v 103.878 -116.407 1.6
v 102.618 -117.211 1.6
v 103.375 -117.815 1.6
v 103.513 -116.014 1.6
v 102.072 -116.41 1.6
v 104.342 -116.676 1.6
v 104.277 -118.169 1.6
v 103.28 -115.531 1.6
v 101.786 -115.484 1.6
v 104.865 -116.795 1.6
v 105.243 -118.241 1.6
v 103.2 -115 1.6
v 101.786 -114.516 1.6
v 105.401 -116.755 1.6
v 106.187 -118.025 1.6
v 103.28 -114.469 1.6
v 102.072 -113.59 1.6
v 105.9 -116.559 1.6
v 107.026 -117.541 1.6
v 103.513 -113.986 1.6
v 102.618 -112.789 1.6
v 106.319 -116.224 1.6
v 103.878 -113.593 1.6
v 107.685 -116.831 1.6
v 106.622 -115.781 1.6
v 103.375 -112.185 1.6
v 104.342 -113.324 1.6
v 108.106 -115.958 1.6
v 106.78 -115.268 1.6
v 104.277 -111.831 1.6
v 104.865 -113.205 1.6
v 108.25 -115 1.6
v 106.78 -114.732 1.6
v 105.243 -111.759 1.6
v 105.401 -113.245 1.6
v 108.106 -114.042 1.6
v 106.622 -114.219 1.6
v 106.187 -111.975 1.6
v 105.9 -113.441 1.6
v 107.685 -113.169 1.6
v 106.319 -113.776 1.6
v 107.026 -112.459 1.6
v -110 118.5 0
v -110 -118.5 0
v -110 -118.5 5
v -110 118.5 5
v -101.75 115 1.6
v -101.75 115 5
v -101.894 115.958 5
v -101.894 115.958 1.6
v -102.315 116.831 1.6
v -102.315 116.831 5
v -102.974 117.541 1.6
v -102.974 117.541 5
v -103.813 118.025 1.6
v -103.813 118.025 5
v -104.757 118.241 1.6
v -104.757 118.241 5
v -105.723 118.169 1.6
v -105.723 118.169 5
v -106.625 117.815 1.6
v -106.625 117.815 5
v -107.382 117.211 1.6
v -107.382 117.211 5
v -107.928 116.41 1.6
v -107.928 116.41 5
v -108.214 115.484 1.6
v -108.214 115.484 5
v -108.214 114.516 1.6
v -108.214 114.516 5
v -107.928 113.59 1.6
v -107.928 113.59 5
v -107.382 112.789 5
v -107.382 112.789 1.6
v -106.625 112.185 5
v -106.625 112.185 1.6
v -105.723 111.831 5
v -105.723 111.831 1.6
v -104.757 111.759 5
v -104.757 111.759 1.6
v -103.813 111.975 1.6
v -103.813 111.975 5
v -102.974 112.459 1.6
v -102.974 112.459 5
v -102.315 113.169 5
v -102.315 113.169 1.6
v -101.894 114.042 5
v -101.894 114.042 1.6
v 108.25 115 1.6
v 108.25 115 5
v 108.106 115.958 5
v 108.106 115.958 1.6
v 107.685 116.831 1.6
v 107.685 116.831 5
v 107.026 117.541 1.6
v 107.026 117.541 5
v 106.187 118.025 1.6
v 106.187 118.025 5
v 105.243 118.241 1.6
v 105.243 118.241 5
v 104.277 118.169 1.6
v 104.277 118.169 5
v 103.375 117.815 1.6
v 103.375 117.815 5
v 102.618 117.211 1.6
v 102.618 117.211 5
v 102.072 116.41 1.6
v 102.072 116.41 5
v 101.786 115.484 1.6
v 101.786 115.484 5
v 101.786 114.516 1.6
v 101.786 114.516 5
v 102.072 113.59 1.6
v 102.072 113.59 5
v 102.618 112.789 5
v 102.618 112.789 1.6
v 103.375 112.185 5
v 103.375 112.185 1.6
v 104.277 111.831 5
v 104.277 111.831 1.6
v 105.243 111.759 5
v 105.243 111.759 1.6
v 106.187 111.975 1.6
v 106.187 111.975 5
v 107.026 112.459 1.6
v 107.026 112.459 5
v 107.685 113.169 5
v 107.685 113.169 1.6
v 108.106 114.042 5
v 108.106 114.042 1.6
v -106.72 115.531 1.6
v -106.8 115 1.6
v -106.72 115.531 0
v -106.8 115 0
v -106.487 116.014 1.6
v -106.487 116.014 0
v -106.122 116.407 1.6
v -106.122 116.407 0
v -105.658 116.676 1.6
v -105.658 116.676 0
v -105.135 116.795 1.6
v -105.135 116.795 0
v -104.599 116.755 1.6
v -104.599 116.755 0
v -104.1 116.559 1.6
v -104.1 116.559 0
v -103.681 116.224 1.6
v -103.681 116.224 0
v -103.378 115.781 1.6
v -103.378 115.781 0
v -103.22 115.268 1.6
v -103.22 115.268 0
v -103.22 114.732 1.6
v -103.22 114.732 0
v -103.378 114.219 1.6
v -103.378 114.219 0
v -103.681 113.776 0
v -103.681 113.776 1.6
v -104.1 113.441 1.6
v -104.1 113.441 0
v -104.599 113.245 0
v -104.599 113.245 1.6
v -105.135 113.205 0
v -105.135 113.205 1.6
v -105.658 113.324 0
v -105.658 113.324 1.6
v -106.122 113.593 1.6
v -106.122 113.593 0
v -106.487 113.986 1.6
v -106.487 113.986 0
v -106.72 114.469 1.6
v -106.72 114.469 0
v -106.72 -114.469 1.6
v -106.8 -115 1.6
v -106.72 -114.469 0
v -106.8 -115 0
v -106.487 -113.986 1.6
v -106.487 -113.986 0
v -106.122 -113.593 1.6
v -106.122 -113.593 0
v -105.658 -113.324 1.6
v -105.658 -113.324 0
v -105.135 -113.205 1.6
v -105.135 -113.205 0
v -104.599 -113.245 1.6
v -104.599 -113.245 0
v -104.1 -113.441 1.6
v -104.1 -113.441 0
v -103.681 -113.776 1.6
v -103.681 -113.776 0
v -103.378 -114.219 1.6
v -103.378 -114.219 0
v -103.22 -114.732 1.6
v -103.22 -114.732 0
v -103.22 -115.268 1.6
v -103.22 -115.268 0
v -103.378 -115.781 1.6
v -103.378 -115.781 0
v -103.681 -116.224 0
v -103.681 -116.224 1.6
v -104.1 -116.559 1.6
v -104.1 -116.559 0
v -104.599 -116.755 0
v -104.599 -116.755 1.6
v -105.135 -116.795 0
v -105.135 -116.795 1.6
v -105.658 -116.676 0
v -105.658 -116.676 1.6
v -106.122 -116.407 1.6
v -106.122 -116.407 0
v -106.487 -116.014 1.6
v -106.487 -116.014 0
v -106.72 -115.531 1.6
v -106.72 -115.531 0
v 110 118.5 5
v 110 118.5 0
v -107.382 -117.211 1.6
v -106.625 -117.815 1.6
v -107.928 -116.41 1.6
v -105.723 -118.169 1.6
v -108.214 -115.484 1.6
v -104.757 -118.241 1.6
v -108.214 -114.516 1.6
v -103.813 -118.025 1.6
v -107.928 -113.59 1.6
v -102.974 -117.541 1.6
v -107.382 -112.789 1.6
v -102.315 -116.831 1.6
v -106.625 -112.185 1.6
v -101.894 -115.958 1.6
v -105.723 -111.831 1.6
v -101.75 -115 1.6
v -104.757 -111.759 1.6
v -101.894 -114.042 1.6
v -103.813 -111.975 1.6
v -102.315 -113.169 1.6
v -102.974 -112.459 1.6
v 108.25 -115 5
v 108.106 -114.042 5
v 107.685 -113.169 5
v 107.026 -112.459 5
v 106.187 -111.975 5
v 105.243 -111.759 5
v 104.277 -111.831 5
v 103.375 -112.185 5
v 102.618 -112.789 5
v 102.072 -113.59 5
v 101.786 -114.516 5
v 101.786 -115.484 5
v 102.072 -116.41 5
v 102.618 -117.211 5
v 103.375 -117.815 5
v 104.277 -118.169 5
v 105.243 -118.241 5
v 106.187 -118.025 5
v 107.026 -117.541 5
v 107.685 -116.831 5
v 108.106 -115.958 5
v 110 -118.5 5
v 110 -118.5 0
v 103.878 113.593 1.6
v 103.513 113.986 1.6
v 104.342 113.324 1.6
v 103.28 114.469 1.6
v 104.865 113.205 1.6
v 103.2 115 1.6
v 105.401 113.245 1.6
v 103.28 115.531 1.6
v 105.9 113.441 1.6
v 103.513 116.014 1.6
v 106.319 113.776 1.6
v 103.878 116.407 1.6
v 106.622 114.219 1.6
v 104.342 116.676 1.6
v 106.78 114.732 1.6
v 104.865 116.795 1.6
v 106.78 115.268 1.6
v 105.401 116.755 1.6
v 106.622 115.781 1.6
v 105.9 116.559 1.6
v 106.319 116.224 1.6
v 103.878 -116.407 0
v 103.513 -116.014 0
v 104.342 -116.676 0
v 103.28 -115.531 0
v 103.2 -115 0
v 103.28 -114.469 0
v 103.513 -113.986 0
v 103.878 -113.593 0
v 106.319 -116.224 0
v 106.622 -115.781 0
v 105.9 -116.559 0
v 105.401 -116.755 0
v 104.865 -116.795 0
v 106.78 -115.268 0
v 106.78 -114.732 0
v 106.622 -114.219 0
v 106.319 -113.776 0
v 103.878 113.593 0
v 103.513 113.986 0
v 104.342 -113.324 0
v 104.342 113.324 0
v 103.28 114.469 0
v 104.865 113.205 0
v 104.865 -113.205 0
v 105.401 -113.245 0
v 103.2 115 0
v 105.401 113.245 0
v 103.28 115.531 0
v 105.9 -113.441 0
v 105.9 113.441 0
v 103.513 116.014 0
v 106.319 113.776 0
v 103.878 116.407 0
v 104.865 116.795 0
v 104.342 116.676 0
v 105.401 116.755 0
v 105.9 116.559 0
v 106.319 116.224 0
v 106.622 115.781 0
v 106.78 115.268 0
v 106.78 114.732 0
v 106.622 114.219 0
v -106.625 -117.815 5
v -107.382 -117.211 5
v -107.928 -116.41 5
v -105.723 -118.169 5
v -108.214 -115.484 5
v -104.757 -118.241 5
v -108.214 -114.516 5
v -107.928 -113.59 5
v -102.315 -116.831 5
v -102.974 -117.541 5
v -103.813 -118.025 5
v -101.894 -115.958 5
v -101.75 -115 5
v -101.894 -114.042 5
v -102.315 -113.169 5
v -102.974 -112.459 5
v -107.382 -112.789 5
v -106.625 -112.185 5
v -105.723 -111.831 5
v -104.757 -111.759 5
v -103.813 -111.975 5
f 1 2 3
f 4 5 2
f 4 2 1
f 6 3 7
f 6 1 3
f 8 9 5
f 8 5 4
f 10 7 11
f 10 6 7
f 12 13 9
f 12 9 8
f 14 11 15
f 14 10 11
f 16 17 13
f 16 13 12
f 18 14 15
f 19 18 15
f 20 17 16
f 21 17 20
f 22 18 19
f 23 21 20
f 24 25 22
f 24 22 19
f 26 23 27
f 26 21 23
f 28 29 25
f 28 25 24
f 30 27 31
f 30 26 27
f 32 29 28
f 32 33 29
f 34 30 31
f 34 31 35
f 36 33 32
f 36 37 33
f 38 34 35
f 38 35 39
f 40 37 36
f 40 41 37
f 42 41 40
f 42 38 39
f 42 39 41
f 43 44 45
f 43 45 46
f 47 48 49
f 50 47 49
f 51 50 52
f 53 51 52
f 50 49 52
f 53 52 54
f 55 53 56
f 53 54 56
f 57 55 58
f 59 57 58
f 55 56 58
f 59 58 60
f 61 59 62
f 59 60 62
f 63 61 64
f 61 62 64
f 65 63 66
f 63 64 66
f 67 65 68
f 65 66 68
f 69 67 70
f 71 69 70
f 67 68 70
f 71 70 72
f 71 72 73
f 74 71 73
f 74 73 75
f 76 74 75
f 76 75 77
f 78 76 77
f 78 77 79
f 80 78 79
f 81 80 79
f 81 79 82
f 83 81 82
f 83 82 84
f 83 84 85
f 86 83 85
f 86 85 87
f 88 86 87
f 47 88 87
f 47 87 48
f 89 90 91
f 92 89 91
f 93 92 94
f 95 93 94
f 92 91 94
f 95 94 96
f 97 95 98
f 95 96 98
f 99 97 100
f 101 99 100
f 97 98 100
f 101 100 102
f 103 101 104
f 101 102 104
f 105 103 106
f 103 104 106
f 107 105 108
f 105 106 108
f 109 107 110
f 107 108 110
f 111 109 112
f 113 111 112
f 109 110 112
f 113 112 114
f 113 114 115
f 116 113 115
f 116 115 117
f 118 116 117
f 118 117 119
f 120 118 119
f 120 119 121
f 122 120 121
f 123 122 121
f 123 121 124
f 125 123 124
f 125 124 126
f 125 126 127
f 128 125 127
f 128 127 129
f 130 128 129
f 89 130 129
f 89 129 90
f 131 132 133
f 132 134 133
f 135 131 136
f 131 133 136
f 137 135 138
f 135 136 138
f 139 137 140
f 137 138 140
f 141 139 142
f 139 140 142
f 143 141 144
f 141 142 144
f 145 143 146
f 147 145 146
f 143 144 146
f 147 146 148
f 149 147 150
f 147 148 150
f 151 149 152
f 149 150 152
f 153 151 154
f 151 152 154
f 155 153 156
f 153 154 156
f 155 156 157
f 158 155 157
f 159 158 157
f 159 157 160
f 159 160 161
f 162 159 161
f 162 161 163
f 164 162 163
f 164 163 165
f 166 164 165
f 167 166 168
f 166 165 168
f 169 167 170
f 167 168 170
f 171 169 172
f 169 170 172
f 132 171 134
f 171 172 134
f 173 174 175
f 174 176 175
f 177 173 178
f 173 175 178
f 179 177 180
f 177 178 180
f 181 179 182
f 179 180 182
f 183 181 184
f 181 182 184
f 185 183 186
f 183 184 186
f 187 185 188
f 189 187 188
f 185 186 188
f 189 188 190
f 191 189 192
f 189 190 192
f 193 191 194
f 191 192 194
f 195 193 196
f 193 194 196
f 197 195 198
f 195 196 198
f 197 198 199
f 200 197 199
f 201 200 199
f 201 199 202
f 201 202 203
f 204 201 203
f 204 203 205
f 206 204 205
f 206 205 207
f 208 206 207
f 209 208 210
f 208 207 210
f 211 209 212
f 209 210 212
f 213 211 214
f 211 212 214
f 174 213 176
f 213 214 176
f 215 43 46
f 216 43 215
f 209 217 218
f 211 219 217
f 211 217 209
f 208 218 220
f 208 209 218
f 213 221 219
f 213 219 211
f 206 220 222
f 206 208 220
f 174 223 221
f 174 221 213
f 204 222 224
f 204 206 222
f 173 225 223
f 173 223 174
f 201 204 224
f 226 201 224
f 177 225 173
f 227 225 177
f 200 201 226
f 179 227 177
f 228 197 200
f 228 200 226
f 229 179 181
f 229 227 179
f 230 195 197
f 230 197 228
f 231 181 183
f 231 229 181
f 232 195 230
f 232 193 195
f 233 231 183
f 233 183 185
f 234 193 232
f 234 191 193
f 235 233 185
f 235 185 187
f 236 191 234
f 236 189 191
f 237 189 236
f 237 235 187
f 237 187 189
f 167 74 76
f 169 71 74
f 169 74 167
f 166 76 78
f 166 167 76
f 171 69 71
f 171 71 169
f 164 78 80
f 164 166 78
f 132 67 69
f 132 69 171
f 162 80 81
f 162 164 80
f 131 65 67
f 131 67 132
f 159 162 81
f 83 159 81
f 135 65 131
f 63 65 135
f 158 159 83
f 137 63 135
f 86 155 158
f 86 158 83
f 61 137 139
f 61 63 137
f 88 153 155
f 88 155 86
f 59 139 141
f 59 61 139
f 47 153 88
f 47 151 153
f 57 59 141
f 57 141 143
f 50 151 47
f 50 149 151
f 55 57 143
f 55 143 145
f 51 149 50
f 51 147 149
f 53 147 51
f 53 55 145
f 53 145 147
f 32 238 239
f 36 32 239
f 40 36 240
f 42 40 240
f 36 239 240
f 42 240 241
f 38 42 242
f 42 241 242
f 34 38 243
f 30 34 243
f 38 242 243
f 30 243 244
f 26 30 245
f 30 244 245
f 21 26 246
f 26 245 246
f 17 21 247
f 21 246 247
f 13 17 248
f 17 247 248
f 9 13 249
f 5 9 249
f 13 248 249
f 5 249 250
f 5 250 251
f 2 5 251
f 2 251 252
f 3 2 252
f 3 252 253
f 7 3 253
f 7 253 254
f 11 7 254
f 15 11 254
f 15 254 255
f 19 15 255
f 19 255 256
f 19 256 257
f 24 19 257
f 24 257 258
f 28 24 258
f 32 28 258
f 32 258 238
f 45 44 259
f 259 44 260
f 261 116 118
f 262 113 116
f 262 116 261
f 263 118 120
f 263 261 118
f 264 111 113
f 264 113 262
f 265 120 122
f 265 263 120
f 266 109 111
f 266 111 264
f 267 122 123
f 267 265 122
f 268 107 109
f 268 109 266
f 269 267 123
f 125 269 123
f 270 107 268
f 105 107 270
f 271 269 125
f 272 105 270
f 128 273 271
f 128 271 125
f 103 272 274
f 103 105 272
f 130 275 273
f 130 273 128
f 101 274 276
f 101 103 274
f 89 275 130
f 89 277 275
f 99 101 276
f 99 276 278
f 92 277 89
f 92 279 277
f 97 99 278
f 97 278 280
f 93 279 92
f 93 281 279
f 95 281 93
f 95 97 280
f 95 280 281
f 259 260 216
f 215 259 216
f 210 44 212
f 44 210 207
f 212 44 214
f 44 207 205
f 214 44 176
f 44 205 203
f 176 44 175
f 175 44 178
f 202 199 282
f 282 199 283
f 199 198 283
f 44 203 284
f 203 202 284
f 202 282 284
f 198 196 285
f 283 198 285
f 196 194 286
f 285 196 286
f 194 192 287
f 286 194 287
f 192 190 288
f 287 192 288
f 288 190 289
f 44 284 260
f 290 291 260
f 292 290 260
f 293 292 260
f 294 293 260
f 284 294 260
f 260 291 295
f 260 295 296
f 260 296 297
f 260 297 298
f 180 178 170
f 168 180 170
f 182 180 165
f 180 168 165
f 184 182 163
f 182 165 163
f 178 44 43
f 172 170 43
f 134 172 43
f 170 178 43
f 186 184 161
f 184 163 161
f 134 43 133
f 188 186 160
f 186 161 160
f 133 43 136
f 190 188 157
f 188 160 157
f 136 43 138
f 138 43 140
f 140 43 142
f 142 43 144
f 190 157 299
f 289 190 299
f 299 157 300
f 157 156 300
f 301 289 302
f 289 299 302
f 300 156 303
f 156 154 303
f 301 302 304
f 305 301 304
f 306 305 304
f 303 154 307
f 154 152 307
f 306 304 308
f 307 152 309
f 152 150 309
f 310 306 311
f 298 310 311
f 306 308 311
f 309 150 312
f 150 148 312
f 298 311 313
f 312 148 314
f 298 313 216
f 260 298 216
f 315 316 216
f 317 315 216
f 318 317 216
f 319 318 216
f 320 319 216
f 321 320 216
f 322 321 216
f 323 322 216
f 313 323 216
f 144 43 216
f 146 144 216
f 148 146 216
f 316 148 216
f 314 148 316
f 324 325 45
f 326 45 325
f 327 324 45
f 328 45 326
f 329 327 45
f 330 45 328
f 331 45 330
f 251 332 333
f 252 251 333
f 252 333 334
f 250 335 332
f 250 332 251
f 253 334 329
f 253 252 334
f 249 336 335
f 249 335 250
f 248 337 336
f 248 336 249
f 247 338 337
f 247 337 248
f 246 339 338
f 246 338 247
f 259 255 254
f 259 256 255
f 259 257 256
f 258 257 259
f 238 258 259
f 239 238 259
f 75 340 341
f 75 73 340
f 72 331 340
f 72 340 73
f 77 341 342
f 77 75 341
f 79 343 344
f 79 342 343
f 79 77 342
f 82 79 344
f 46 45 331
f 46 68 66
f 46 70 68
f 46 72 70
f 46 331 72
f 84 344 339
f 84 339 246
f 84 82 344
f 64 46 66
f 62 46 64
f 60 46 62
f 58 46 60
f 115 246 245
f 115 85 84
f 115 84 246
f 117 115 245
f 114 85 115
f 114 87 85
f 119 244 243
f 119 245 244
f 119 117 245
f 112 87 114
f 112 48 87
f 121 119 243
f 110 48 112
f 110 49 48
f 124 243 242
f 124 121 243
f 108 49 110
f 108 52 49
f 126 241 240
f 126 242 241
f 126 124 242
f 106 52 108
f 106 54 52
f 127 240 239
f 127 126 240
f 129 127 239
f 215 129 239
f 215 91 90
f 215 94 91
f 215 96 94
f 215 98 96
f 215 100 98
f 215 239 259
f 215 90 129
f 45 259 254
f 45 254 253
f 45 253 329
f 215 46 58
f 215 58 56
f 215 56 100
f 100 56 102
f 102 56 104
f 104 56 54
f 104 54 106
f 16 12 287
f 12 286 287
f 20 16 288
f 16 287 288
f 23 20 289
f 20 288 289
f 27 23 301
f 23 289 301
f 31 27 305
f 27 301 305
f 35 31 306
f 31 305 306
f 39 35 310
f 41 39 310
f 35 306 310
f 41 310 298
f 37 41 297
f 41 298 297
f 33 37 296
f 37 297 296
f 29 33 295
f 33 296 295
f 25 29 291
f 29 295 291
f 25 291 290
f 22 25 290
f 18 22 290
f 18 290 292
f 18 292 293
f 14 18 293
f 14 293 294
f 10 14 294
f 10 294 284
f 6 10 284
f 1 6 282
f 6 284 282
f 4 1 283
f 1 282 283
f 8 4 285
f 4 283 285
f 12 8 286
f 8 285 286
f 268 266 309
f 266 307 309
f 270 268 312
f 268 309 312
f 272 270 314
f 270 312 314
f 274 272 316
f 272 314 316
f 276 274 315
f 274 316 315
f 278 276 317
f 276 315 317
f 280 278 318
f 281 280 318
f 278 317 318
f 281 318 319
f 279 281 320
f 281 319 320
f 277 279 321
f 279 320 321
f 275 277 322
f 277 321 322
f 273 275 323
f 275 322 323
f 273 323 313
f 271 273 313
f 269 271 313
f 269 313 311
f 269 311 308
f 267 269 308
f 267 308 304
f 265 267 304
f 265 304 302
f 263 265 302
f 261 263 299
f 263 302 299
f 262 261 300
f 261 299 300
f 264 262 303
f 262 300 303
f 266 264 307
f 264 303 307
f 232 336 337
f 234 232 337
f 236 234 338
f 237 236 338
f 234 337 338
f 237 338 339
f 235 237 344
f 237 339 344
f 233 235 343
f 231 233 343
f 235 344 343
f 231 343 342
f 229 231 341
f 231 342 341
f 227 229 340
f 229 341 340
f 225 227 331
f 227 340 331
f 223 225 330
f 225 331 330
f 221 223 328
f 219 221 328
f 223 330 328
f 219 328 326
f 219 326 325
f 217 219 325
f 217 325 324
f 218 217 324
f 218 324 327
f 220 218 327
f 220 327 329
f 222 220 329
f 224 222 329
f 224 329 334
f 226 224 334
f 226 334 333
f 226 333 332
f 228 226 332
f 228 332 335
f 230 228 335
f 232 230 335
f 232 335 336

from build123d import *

# Parameters (mm, degrees)
SZKIC1_W                                            = 220
SZKIC1_H                                            = 237
DODANIE_WYCI_GNI_CIE1_DEPTH                         = 5
POG_BIENIE_WALCOWE_POD_M3_WKR_T_Z_BEM_W_D           = 3.6
POG_BIENIE_WALCOWE_POD_M3_WKR_T_Z_BEM_W_DEPTH       = 6.7
POG_BIENIE_WALCOWE_POD_M3_WKR_T_Z_BEM_W_CBORE_D     = 6.5
POG_BIENIE_WALCOWE_POD_M3_WKR_T_Z_BEM_W_CBORE_DEPTH = 3.4
POG_BIENIE_WALCOWE_POD_M3_WKR_T_Z_BEM_W_TIP         = 1.081549114


with BuildPart() as part:
    # Szkic1 → Dodanie-wyciągnięcie1 (new body)
    with BuildSketch(Plane.XY):
        Rectangle(SZKIC1_W, SZKIC1_H)
    extrude(amount=DODANIE_WYCI_GNI_CIE1_DEPTH)

    # Pogłębienie walcowe pod M3 Wkręt z łbem walcowym z gniazdem1
    with Locations(Plane.XY.offset(5)):
        with Locations((105, -115), (105, 115), (-105, 115), (-105, -115)):
            CounterBoreHole(POG_BIENIE_WALCOWE_POD_M3_WKR_T_Z_BEM_W_D / 2, POG_BIENIE_WALCOWE_POD_M3_WKR_T_Z_BEM_W_CBORE_D / 2, POG_BIENIE_WALCOWE_POD_M3_WKR_T_Z_BEM_W_CBORE_DEPTH, depth=POG_BIENIE_WALCOWE_POD_M3_WKR_T_Z_BEM_W_DEPTH)
            with Locations((0, 0, -(POG_BIENIE_WALCOWE_POD_M3_WKR_T_Z_BEM_W_DEPTH + POG_BIENIE_WALCOWE_POD_M3_WKR_T_Z_BEM_W_TIP / 2))):  # 118° drill point
                Cone(0, POG_BIENIE_WALCOWE_POD_M3_WKR_T_Z_BEM_W_D / 2, POG_BIENIE_WALCOWE_POD_M3_WKR_T_Z_BEM_W_TIP, mode=Mode.SUBTRACT)


solid = part.part
